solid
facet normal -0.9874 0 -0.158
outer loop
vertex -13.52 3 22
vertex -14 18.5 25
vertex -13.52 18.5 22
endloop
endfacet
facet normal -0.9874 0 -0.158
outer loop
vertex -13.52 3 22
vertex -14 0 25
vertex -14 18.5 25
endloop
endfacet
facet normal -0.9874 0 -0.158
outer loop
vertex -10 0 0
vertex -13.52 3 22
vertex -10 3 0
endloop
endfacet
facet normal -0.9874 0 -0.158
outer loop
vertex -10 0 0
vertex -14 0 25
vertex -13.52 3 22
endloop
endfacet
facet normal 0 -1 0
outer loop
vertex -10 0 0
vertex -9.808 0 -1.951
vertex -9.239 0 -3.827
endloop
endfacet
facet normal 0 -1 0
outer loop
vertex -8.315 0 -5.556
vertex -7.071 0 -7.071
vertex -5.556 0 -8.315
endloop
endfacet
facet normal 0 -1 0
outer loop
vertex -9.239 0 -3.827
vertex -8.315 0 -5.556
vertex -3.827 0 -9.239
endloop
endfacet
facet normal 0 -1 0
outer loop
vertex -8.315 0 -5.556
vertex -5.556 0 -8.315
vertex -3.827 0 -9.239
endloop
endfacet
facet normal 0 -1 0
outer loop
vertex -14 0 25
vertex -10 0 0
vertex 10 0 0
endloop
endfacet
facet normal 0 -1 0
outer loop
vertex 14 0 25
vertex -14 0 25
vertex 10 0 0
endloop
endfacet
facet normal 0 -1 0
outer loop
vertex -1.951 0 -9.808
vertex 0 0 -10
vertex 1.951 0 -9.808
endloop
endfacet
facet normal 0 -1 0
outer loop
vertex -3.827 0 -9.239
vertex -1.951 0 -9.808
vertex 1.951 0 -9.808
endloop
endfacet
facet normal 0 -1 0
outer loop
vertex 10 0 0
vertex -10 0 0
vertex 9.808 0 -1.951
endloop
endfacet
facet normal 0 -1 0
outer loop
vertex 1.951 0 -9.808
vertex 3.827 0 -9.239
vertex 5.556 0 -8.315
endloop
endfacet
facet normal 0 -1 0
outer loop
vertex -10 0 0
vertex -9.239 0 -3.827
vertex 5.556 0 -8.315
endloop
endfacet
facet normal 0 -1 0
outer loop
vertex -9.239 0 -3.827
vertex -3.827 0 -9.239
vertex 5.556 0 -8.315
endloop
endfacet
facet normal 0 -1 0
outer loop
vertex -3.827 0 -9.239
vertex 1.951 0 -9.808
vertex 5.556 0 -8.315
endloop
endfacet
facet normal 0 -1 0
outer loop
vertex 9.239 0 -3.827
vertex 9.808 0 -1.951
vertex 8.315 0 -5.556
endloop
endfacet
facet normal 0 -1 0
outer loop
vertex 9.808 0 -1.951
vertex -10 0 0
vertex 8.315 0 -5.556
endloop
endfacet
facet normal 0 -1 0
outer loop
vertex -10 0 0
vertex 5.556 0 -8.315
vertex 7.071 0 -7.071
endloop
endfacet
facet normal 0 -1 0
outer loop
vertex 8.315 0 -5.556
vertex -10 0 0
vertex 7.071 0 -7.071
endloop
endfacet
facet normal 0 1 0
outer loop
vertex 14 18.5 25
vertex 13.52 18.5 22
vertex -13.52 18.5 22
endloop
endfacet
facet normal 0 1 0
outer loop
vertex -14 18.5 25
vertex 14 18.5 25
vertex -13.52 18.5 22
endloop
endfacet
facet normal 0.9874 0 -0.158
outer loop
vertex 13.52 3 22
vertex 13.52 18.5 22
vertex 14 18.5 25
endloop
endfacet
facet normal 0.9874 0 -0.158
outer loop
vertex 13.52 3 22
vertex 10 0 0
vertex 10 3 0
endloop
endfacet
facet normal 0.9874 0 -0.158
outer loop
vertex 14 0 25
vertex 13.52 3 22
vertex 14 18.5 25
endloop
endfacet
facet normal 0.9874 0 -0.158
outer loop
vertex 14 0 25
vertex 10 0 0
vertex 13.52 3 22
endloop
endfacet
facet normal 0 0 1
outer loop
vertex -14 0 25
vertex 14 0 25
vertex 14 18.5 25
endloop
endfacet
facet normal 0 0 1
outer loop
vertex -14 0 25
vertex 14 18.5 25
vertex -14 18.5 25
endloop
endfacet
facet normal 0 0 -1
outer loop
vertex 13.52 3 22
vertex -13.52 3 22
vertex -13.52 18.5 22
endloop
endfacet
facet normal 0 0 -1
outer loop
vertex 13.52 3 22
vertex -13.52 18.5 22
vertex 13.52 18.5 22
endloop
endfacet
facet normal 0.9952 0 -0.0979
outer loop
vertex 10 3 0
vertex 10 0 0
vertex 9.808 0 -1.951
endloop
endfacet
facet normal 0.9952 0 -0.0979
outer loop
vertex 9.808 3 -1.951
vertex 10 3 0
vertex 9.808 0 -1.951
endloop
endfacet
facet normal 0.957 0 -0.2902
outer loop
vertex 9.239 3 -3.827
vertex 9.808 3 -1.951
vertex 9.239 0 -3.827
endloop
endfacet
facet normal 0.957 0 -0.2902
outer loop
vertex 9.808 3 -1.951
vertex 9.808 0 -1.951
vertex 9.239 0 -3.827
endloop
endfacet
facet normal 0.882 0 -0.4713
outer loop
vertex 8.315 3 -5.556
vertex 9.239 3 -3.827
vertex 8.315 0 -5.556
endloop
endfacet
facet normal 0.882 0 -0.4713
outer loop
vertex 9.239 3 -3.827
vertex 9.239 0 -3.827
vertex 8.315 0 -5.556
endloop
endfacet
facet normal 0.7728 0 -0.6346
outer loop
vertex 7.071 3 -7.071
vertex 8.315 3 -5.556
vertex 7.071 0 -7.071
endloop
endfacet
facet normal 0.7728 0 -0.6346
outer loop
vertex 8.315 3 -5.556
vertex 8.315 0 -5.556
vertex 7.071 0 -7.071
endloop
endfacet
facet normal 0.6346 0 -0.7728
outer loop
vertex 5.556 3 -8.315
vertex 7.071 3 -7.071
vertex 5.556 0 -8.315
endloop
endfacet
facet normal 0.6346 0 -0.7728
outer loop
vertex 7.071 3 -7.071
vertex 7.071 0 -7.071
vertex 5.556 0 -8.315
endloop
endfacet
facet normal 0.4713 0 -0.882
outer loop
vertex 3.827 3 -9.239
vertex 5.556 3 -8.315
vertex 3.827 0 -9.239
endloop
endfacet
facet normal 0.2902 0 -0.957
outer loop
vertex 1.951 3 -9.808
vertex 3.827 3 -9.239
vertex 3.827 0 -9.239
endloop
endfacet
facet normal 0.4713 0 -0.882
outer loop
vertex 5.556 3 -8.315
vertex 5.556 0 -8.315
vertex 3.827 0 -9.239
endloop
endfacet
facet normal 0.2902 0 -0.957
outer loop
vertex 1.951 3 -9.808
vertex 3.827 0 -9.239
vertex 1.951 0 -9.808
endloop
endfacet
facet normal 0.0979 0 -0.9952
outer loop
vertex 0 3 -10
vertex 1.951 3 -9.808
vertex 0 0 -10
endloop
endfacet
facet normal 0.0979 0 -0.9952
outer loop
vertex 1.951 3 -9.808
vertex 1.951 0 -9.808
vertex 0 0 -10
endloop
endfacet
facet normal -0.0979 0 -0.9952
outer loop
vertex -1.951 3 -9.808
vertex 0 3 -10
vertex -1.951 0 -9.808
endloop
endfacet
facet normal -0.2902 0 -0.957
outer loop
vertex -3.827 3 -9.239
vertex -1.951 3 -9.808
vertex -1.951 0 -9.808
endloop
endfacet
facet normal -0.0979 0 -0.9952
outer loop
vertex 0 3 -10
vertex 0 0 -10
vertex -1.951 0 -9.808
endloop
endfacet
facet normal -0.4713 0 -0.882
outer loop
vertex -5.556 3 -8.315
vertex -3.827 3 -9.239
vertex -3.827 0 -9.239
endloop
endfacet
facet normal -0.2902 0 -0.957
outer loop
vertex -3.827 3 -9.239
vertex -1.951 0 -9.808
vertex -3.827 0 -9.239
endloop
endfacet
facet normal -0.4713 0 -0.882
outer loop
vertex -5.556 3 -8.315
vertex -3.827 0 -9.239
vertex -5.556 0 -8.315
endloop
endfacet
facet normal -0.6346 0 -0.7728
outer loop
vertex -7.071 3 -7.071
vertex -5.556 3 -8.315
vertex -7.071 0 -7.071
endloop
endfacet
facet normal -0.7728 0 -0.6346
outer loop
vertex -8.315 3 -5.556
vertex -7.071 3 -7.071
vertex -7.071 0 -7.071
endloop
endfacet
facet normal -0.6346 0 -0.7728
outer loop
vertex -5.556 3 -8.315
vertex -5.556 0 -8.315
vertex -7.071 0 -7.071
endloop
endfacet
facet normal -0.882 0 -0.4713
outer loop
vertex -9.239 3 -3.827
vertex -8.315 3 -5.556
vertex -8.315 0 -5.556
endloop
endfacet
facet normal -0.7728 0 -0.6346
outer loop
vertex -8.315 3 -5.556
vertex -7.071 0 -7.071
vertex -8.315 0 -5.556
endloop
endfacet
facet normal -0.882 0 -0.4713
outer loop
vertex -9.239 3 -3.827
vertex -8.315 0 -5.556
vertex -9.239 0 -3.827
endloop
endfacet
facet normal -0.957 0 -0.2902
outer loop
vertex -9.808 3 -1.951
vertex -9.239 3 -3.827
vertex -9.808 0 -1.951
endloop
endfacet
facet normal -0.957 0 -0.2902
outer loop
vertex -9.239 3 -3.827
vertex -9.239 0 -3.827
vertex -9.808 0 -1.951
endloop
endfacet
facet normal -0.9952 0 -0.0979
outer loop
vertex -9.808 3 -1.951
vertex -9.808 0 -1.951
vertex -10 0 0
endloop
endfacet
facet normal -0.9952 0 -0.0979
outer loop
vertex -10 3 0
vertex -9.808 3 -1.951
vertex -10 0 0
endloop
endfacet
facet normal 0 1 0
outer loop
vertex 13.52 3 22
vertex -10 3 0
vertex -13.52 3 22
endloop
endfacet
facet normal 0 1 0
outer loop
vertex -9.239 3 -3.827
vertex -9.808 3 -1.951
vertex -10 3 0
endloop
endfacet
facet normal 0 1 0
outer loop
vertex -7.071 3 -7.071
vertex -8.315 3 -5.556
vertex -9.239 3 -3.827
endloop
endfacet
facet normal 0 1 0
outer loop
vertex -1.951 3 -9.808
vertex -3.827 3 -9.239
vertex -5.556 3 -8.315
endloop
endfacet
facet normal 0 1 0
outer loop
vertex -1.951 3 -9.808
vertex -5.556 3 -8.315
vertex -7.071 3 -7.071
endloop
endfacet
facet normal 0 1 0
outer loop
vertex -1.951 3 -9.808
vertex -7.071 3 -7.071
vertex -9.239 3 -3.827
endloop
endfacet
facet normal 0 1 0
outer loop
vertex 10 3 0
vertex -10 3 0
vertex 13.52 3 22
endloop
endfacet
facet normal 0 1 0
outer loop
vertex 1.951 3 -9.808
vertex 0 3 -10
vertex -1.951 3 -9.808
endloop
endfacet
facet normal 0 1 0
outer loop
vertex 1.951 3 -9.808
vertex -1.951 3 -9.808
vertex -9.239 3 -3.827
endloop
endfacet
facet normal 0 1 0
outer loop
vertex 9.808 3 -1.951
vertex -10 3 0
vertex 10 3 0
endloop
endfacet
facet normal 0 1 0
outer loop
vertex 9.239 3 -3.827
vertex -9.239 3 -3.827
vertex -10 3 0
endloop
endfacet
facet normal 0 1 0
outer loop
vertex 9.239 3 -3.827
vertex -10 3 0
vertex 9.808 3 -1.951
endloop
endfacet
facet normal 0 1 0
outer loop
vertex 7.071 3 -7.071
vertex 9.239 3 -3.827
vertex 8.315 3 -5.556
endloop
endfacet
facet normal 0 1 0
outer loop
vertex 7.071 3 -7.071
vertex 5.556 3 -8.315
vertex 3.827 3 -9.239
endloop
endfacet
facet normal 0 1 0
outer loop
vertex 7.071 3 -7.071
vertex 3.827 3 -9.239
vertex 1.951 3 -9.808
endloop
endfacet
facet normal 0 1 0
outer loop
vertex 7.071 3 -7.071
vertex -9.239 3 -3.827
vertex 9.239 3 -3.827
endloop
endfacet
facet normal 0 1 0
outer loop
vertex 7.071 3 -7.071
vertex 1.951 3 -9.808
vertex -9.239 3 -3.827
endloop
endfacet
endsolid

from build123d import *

# Parameters (mm, degrees)
BOSS_EXTRUDE1_DEPTH = 3
BOSS_EXTRUDE2_DEPTH = 15.5


with BuildPart() as part:
    # Sketch1 → Boss-Extrude1 (new body)
    with BuildSketch(Plane(origin=(0, 0, 0), x_dir=(1, 0, 0), z_dir=(0, 1, 0))):
        with BuildLine():
            Line((-10, 0), (-14, -25))
            Line((-14, -25), (14, -25))
            Line((14, -25), (10, 0))
            ThreePointArc((10, 0), (0, 10), (-10, 0))
        make_face()
    extrude(amount=BOSS_EXTRUDE1_DEPTH)

    # Sketch5 → Boss-Extrude2 (add)
    with BuildSketch(Plane(origin=(0, 3, 0), x_dir=(1, 0, 0), z_dir=(0, 1, 0))):
        Polygon((-13.52, -22), (13.52, -22), (14, -25), (-14, -25), align=None)
    extrude(amount=BOSS_EXTRUDE2_DEPTH)


solid = part.part
